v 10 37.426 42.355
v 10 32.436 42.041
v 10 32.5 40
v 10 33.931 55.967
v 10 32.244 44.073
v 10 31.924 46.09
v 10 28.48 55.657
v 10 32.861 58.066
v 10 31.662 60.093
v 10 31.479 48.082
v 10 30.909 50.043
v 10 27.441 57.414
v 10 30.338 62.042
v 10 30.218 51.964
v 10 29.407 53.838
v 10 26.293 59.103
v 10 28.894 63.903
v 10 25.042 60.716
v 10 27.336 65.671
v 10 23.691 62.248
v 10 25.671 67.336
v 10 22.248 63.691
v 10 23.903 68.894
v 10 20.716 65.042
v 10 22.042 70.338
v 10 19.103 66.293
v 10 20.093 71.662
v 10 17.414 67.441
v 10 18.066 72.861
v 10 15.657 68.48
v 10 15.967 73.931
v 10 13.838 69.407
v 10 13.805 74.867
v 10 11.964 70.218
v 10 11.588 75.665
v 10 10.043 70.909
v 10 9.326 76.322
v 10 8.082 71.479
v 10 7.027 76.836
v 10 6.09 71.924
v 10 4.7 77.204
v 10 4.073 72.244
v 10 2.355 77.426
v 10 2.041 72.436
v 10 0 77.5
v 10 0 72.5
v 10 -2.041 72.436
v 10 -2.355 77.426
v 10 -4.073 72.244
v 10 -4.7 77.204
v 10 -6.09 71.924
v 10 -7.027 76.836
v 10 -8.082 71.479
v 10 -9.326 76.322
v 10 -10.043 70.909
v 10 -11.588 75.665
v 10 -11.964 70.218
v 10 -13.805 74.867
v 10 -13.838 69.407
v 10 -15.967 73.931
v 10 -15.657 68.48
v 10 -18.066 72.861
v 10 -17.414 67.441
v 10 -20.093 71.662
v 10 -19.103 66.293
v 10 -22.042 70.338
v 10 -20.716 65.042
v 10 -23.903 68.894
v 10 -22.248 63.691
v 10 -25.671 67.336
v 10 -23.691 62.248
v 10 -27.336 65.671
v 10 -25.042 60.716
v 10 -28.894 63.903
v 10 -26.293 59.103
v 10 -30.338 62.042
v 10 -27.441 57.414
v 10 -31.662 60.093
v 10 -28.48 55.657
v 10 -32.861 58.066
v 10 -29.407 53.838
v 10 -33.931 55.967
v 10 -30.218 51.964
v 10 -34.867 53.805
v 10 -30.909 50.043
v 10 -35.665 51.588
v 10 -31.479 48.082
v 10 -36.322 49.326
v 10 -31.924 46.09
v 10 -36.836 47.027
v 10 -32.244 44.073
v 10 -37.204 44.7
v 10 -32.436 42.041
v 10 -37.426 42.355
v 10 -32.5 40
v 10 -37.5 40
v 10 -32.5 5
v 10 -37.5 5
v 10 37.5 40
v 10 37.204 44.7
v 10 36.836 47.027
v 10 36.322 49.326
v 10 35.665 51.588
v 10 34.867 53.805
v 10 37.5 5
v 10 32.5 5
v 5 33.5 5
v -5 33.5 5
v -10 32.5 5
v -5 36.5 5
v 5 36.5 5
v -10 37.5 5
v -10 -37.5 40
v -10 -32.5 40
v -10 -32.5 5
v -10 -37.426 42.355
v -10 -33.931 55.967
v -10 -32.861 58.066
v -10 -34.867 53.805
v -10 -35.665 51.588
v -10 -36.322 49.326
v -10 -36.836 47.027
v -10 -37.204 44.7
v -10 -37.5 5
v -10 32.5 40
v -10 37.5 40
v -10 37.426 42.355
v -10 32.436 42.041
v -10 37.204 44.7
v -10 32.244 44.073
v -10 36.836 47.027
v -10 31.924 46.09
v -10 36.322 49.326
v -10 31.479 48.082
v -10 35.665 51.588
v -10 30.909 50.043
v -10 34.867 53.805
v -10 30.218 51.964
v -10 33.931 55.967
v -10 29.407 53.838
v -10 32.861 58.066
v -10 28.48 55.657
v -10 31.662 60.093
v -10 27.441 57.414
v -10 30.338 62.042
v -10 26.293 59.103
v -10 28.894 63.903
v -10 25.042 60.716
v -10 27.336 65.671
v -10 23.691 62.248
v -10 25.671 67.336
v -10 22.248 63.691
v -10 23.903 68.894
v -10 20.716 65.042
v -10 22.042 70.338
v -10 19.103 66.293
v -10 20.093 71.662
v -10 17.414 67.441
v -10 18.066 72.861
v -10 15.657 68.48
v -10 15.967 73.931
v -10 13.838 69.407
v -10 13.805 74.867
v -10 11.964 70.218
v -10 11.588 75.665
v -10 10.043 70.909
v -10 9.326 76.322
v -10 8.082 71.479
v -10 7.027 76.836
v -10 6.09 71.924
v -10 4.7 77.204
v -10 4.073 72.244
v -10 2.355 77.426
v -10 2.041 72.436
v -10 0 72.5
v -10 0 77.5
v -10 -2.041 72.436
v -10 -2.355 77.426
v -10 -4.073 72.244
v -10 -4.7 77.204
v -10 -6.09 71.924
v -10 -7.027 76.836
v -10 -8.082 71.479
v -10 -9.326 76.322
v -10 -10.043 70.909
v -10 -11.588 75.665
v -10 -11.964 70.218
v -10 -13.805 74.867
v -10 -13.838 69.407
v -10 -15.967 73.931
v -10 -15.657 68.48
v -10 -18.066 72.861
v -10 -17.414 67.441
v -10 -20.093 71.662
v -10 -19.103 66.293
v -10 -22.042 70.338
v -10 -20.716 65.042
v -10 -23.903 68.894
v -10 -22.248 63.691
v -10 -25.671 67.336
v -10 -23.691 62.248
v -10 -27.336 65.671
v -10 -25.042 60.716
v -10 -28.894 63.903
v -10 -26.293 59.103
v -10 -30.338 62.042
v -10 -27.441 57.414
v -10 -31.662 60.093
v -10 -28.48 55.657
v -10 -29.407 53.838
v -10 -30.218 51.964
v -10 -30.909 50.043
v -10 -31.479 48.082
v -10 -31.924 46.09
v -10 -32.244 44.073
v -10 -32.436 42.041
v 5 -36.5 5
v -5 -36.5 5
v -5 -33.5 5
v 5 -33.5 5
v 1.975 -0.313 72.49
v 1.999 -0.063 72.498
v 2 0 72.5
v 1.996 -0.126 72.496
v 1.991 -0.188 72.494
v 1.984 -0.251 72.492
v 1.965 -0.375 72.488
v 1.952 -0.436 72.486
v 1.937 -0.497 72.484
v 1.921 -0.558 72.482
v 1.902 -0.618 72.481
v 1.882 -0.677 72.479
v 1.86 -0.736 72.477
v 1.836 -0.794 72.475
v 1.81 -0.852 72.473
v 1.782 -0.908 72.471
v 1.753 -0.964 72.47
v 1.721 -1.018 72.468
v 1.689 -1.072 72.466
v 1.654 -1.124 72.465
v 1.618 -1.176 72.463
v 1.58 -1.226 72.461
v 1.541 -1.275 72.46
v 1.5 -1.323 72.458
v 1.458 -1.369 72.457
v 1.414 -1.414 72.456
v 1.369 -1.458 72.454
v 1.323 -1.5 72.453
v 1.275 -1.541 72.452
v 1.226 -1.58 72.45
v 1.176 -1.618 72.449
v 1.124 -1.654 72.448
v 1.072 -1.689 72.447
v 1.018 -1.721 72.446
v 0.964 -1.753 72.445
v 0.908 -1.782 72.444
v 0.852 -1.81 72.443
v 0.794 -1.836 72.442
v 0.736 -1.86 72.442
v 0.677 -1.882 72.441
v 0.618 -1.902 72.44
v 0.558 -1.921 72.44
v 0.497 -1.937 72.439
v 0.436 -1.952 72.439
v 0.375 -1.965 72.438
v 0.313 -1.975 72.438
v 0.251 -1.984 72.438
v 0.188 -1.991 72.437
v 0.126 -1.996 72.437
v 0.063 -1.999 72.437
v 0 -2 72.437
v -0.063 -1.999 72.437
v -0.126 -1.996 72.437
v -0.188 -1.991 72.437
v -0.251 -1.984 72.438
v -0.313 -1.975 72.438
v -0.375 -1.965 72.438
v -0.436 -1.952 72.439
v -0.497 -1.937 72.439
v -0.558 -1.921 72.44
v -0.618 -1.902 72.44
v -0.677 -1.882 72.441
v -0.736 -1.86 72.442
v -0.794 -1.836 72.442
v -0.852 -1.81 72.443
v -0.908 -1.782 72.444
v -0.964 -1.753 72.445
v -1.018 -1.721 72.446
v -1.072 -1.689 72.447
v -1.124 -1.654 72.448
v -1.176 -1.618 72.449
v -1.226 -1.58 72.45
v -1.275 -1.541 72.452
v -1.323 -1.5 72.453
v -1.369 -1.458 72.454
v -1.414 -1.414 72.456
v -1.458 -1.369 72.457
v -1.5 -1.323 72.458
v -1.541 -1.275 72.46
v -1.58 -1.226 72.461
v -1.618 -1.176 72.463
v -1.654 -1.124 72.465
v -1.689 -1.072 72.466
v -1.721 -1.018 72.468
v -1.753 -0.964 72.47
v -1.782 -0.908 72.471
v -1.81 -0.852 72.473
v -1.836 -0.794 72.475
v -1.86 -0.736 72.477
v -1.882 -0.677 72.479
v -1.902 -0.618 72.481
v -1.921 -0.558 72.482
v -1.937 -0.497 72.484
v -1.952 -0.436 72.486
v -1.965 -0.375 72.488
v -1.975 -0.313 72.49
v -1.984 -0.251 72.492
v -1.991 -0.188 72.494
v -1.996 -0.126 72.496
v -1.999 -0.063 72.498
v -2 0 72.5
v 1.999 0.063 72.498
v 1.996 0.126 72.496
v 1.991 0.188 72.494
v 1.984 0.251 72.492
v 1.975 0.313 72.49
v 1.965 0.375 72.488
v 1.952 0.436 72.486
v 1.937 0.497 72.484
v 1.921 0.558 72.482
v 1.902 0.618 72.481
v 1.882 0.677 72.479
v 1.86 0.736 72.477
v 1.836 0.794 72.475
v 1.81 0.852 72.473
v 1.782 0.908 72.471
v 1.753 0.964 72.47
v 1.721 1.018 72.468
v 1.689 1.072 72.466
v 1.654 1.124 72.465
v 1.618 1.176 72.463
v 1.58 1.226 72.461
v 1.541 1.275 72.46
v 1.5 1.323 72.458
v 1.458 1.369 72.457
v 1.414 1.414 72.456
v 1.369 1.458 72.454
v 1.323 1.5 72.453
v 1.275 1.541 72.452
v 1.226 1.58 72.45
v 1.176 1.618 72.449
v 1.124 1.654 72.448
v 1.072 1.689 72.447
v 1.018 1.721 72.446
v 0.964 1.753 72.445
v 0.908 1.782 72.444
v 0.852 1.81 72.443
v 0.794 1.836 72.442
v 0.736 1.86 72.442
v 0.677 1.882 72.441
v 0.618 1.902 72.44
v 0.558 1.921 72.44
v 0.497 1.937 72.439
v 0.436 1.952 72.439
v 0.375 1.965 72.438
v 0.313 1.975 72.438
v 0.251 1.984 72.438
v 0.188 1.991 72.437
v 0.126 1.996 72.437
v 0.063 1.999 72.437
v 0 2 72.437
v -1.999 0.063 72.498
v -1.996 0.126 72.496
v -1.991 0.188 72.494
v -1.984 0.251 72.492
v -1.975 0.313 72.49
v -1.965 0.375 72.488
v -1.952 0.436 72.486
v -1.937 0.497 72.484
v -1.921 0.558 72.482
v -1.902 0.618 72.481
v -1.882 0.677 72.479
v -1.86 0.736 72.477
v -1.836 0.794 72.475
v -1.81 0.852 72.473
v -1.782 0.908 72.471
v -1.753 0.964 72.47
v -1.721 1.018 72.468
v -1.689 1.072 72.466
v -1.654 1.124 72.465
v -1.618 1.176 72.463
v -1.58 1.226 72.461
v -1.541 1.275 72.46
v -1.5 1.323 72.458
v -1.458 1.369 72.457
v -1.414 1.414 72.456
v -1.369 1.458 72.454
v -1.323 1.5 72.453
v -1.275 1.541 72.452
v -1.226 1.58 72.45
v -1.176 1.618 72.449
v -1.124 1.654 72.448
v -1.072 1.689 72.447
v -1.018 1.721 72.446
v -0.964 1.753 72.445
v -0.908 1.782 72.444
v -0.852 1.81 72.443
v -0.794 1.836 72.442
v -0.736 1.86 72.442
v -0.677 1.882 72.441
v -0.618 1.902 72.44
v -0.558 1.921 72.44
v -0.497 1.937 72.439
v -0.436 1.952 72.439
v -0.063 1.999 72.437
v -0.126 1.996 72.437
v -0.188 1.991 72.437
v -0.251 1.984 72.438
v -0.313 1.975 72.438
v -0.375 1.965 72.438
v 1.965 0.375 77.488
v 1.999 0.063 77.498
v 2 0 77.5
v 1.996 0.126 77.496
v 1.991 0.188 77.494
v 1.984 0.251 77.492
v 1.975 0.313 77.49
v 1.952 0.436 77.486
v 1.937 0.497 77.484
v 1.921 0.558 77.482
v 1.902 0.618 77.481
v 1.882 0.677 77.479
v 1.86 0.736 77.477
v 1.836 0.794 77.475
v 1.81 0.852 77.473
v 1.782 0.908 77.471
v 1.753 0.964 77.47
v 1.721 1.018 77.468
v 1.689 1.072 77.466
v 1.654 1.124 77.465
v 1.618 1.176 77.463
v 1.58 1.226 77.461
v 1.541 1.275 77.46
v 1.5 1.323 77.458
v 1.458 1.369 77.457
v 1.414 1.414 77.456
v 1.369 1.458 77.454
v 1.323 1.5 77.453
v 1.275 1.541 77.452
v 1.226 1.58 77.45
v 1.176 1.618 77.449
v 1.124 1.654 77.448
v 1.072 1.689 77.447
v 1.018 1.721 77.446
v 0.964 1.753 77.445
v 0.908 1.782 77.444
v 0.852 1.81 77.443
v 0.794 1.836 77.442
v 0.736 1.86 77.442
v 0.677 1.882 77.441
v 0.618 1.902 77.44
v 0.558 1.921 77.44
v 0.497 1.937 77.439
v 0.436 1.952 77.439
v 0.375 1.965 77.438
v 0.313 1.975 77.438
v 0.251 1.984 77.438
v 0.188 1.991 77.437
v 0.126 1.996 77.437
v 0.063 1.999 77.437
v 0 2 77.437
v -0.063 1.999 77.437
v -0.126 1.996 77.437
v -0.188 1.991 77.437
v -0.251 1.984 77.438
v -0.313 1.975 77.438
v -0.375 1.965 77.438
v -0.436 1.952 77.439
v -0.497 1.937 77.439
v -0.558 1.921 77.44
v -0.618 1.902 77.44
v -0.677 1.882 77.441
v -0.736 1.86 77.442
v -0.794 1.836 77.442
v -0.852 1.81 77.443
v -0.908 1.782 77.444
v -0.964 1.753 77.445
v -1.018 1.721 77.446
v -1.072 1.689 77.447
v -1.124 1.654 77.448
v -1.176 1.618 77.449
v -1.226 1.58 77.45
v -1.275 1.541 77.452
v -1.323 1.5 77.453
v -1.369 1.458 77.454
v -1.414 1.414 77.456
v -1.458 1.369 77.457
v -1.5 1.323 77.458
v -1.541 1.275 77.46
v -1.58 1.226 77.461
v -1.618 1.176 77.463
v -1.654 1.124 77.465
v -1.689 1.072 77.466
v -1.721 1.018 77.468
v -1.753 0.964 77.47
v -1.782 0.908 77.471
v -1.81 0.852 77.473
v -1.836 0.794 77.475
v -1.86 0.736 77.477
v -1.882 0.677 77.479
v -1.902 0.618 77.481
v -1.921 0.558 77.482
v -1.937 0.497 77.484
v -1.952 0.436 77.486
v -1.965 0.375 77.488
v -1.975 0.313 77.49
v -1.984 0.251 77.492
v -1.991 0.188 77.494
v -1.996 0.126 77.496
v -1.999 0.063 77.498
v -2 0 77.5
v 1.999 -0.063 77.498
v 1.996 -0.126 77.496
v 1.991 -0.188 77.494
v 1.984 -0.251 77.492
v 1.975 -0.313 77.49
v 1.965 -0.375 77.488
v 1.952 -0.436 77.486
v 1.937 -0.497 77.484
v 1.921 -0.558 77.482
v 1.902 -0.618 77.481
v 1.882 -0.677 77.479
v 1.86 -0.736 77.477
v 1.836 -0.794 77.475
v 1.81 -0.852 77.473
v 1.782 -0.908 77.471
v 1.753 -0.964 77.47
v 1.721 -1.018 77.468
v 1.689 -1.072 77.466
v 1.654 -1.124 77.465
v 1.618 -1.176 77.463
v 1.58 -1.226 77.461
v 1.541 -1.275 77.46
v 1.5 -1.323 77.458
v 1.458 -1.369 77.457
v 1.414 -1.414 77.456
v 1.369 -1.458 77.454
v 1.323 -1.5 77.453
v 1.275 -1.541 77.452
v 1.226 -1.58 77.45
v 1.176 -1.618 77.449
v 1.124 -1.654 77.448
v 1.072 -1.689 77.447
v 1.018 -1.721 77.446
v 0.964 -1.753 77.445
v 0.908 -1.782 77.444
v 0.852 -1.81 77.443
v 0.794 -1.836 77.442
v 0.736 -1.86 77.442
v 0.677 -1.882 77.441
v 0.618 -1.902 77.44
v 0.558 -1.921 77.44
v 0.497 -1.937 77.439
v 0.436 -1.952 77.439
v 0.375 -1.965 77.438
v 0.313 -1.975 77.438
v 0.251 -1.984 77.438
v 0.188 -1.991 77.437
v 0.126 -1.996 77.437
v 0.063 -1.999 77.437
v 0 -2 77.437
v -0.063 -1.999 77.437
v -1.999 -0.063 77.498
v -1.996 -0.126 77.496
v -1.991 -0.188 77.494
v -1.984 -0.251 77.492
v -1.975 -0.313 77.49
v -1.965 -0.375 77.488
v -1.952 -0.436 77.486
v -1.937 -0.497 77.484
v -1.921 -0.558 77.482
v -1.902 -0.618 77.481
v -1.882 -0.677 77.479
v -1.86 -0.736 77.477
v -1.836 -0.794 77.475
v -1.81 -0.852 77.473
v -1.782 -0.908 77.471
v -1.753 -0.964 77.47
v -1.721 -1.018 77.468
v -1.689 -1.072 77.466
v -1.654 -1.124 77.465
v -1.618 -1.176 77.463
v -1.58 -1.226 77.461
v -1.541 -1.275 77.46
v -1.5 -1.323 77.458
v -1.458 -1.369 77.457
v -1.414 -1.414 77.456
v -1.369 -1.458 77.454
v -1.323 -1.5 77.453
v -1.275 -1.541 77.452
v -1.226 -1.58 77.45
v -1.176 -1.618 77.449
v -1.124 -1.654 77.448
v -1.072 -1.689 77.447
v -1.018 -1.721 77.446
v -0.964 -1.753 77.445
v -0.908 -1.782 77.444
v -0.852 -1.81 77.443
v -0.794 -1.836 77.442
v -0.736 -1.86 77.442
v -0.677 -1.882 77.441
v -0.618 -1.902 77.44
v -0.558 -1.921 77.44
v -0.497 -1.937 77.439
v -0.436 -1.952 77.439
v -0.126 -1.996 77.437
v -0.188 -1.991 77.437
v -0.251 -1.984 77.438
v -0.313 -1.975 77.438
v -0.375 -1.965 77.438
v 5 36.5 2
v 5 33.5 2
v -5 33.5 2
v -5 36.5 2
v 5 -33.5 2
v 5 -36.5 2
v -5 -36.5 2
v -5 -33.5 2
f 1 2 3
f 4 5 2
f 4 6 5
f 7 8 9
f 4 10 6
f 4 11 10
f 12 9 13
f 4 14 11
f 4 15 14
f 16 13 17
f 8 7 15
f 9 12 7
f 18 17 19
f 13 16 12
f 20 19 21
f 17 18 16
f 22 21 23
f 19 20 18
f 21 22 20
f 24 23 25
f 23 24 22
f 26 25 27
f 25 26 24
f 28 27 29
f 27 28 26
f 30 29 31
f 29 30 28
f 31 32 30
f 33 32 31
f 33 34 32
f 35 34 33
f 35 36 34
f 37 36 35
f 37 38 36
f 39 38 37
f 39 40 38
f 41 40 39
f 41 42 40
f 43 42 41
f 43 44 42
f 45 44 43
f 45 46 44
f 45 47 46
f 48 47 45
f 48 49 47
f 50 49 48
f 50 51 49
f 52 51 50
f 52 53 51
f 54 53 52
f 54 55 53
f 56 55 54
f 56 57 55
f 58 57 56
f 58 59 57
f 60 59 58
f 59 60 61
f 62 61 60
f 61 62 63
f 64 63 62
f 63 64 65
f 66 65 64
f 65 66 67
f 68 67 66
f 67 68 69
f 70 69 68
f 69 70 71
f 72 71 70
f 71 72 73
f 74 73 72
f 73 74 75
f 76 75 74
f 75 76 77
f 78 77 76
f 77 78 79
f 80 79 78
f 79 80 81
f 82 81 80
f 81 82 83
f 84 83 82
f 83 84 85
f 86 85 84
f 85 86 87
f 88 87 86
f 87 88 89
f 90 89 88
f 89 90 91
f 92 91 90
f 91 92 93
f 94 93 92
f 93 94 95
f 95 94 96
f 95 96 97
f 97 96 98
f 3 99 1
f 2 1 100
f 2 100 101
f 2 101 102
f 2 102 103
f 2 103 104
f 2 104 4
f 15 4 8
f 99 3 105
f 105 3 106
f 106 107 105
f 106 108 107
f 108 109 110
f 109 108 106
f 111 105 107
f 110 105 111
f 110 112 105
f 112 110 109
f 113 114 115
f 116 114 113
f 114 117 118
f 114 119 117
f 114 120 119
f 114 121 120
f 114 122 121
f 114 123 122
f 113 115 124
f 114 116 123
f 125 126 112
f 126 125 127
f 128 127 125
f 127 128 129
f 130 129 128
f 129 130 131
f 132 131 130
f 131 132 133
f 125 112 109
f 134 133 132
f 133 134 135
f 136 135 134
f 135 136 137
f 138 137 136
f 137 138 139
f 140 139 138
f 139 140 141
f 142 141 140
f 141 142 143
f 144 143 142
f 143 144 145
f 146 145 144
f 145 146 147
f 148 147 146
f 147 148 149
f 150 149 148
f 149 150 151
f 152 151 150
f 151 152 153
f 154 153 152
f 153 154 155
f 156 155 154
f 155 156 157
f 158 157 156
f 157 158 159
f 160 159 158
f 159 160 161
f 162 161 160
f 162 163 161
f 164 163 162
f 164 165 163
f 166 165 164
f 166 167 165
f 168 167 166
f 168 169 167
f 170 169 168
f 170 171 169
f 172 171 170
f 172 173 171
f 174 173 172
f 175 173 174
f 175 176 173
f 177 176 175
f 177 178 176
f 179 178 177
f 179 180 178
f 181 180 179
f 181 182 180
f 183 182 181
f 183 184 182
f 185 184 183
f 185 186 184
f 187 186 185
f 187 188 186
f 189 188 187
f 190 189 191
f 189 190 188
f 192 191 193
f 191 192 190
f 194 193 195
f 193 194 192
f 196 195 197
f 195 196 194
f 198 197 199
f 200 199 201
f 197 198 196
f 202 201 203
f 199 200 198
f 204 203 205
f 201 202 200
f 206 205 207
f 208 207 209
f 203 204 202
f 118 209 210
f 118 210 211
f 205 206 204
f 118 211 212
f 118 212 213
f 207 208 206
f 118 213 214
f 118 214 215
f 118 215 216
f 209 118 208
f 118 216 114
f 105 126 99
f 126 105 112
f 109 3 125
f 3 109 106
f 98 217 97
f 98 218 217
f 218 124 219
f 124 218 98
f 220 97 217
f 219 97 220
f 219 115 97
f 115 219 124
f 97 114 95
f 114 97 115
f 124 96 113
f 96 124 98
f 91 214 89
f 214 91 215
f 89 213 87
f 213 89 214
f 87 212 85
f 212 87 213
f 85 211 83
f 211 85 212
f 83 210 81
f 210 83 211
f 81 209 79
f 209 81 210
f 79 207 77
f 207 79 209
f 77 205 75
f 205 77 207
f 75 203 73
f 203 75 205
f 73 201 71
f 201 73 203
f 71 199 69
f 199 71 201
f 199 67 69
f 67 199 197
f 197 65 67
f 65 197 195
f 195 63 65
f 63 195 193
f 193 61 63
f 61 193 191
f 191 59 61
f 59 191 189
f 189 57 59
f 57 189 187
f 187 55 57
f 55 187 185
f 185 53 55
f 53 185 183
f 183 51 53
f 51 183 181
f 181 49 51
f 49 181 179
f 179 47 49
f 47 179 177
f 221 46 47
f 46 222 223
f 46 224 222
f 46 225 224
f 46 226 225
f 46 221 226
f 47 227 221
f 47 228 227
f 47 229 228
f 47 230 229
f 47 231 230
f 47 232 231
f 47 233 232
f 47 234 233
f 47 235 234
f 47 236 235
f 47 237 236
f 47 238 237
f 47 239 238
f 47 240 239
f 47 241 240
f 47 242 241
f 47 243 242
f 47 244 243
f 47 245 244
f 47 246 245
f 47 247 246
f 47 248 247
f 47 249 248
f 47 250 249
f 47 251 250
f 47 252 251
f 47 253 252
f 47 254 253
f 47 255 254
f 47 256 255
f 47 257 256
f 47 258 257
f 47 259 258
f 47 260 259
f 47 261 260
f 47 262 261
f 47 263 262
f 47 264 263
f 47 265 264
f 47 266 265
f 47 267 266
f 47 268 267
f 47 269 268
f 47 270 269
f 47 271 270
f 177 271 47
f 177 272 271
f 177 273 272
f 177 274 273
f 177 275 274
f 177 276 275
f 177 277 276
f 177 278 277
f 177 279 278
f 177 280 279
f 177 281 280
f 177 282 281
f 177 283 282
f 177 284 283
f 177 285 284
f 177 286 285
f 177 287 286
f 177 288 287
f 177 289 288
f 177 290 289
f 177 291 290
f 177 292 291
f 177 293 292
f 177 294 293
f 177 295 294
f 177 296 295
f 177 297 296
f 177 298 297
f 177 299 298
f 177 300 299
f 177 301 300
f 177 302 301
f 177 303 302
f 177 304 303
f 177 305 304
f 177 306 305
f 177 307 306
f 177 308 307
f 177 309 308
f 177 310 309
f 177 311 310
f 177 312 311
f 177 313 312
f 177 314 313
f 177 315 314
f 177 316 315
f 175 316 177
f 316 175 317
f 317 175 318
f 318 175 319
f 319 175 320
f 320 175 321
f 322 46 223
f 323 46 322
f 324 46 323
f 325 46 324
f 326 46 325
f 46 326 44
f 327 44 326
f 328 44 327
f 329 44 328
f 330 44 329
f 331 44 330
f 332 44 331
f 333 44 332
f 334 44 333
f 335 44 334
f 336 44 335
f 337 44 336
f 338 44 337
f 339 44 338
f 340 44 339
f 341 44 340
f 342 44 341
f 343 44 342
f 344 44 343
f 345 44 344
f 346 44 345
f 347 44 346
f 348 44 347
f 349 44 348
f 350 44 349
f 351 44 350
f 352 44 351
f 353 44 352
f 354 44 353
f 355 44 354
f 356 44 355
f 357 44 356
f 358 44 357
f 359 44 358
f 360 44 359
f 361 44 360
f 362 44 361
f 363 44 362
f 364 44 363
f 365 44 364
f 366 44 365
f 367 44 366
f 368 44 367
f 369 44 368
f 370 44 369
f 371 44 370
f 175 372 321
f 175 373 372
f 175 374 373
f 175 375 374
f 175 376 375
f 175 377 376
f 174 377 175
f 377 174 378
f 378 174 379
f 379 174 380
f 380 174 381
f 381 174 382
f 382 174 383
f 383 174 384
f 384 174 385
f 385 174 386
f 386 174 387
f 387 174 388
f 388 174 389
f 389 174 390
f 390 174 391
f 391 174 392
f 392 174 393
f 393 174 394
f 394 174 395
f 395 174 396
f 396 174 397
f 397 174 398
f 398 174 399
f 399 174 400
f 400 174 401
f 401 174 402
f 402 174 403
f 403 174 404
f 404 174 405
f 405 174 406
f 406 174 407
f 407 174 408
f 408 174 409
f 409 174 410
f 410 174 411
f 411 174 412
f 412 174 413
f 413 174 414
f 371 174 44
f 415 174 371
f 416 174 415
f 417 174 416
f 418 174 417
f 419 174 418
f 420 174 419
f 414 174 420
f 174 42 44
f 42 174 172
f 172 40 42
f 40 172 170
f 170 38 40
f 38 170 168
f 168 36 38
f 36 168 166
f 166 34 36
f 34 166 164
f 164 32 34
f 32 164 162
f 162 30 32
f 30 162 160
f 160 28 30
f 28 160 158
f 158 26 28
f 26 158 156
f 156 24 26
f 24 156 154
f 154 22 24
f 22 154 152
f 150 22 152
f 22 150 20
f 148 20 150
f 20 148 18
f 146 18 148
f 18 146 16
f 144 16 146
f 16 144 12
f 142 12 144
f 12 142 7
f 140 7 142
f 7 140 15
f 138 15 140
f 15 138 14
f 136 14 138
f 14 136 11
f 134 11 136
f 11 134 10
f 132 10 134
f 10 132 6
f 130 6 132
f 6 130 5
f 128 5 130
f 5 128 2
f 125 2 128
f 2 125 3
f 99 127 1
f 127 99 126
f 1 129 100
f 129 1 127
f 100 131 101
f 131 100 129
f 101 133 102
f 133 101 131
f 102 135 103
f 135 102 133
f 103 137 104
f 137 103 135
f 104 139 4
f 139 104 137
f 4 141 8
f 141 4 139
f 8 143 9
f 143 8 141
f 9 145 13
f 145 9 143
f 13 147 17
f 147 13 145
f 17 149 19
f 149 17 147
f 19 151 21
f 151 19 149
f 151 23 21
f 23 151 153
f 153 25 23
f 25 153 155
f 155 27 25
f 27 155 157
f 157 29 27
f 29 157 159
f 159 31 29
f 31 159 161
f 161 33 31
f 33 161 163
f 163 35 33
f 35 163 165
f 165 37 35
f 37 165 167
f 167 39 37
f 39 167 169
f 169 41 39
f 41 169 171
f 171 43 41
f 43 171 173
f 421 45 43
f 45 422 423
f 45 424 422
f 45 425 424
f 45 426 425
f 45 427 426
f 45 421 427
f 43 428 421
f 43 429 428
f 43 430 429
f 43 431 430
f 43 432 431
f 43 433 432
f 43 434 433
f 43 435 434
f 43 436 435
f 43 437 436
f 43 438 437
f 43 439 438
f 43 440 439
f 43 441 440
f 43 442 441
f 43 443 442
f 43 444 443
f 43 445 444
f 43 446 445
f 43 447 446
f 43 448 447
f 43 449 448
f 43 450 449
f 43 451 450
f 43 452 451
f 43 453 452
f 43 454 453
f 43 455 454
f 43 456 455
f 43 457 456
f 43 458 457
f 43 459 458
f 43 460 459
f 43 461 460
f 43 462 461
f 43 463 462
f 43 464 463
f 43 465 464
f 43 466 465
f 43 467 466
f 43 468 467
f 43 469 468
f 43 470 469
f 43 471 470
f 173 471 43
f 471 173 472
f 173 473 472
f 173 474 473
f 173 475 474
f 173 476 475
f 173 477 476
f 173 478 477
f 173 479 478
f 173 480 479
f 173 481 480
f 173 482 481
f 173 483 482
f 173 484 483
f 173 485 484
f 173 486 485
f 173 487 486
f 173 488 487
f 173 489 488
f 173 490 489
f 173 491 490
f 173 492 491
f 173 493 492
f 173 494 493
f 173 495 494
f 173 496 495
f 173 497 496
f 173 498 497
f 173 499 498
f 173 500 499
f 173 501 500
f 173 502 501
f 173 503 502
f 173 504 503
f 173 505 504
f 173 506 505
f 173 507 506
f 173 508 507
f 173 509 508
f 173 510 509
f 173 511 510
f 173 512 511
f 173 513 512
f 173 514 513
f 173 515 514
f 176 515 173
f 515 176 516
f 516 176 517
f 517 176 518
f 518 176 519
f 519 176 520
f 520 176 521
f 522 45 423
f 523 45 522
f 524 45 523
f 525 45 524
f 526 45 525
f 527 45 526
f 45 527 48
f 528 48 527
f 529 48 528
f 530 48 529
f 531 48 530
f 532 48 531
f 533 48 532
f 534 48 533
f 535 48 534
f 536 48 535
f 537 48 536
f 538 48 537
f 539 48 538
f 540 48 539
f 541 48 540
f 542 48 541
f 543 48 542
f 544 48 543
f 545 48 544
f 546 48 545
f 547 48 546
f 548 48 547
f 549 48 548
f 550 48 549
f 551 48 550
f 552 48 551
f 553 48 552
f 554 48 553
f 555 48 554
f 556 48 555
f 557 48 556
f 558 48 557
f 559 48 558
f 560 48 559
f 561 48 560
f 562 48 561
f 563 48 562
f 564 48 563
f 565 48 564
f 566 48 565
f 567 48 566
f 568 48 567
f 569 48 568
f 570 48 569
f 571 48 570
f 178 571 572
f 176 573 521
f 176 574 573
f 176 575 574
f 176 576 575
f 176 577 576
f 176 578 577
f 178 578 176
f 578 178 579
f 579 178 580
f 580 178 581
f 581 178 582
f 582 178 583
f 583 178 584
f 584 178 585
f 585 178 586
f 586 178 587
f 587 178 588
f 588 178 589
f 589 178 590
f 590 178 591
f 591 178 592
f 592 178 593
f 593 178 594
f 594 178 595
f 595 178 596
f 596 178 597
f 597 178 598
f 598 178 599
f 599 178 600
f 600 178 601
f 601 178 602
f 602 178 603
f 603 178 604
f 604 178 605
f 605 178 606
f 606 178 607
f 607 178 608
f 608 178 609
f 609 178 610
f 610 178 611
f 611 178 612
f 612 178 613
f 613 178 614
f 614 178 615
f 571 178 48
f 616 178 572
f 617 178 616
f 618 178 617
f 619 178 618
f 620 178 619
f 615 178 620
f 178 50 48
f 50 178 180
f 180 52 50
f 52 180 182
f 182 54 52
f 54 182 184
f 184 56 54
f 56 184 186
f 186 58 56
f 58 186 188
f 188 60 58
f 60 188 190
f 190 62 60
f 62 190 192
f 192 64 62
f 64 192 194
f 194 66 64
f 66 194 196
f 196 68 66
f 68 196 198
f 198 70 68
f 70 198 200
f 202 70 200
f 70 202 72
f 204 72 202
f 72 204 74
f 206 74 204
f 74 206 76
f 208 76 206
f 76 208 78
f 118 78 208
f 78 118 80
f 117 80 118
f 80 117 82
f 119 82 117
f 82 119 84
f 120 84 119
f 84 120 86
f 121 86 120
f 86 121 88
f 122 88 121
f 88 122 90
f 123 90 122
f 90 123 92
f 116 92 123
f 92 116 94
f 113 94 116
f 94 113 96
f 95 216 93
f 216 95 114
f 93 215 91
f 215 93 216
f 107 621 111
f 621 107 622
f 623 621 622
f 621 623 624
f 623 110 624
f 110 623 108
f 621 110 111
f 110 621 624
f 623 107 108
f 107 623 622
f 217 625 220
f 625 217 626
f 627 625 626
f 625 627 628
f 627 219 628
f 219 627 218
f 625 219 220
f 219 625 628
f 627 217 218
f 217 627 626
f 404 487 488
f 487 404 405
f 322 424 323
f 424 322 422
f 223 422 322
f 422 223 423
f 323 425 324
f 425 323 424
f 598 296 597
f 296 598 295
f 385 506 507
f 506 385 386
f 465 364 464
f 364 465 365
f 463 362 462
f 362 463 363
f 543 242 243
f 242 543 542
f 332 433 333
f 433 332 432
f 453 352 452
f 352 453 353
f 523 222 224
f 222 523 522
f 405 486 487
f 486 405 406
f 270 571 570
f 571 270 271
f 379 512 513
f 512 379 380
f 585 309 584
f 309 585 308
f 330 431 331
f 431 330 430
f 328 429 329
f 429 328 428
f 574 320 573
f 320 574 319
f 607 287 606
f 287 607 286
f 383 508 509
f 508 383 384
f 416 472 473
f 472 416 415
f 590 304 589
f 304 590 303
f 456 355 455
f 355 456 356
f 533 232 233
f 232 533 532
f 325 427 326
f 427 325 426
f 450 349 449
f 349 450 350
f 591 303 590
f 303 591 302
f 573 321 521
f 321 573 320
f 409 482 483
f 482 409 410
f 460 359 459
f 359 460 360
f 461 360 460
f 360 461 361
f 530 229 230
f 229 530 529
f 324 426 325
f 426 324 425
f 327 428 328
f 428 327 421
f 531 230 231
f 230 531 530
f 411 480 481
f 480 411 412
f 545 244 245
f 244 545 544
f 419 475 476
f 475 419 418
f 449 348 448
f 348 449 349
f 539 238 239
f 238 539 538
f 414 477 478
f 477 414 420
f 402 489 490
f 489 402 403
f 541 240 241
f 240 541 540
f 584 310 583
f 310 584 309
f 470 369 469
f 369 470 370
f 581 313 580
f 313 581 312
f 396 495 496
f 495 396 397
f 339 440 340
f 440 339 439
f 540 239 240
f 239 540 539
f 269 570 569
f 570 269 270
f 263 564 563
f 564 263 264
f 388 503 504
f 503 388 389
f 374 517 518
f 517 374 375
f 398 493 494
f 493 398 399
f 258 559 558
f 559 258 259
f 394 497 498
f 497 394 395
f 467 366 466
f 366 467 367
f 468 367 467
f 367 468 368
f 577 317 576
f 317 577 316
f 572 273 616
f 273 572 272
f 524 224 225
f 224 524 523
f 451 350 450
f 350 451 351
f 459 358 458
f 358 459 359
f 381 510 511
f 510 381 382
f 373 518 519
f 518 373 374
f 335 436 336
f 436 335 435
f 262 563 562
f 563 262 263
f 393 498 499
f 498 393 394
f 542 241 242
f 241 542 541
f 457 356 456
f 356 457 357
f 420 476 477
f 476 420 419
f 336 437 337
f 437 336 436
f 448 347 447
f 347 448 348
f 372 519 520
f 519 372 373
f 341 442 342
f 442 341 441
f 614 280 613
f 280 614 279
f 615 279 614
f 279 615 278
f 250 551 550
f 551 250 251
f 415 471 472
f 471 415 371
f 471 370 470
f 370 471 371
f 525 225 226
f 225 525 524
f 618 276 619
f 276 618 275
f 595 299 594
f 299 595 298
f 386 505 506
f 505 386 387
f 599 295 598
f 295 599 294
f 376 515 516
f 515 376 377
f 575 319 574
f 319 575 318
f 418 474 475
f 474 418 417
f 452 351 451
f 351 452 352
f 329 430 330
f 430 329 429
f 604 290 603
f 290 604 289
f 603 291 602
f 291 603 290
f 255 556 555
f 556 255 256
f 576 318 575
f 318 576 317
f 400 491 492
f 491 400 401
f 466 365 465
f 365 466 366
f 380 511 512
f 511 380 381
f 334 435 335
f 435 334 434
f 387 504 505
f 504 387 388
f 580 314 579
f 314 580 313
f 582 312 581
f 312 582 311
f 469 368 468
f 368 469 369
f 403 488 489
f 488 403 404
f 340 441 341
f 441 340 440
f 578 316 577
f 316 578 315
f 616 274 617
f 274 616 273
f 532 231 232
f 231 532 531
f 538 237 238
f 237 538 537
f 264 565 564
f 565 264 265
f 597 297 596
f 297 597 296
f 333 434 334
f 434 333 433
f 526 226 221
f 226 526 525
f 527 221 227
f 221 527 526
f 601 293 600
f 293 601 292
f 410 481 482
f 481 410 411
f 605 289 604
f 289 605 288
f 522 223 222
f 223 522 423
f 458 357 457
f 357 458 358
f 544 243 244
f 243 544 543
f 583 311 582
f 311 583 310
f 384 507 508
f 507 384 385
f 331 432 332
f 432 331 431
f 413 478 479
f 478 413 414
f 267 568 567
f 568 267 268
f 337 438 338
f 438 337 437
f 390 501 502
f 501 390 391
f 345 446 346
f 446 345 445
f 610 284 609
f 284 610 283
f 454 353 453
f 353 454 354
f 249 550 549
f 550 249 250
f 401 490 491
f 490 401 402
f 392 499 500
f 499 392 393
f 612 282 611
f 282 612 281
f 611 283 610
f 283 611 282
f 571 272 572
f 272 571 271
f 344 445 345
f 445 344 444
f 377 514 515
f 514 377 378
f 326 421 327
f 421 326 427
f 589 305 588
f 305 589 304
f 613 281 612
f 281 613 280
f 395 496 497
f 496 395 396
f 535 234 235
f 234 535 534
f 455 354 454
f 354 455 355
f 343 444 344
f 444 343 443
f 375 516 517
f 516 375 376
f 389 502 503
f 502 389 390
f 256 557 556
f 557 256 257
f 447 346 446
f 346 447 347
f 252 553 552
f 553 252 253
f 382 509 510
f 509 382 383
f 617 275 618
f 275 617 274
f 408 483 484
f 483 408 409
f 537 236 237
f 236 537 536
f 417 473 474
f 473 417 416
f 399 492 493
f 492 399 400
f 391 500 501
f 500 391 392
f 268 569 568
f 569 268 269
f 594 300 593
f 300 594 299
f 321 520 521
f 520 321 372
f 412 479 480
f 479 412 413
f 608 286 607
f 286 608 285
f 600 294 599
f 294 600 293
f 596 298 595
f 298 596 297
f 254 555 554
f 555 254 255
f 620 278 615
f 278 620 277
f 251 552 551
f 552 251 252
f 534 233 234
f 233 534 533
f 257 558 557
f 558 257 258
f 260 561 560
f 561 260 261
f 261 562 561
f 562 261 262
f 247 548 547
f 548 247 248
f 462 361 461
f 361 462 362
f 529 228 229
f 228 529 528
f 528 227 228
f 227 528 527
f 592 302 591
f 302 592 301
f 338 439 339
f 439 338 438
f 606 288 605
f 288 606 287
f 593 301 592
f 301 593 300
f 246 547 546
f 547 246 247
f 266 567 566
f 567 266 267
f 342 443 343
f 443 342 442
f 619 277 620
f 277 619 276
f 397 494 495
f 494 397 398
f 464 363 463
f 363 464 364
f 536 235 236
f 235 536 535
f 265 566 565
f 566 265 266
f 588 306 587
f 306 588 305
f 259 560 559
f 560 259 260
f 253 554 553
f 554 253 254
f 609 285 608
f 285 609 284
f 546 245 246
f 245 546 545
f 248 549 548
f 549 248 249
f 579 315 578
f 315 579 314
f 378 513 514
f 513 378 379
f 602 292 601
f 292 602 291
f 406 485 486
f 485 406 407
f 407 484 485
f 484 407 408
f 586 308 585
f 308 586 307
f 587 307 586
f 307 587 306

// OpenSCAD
 
 doArc=true;
 doBase=false;
 separator=false;
 
 
 lc_h=5; // large cylinder heigh 
 lc_r=50; // large cylinder radius
 n = 16; // number holes
 sc_h=lc_h+2; // small cylinder heigh 
 sc_r=2; // small cylinder radius
 sc_R= lc_r - 3 * sc_r; // place small holes on this circle
 
 arc_r = 35; // arch radius
 arc_w = 20; // arch width
 arc_h = arc_r; //
 arc_l = lc_h;
 
 arc_length=10;
 arc_width=3;
 arc_height=3;
 
 $fn=200;
 step = 360/n;
 offset = step/2.; // rotate holes by this ammount
 
function vectorLength(v1,v2) = sqrt(
    (v2[0]-v1[0])*(v2[0]-v1[0])+
    (v2[1]-v1[1])*(v2[1]-v1[1])+
    (v2[2]-v1[2])*(v2[2]-v1[2]));

function lookAt(v1, v2) =
    let(v = v2-v1)
    [
       0,
       acos(v[2]/vectorLength(v1,v2)),
       atan2(v[1], v[0])
    ];

module cylinderBetween(p1,p2,radius)
{
    translate(p1)
    rotate(lookAt(p1,p2))
    cylinder(vectorLength(p1,p2),radius,radius);
}

module ancor(length, width, height)
{
    translate([-length/2,
               arc_r-width/2,
               lc_h-height])
    cube([length, width, height+1]);
    translate([-length/2,
               -arc_r-width/2,
                lc_h-height])
    cube([length, width, height+1]);
}

module sector(radius, angles, fn = 24) {
    r = radius / cos(180 / fn);
    step = -360 / fn;

    points = concat([[0, 0]],
        [for(a = [angles[0] : step : angles[1] - 360]) 
            [r * cos(a), r * sin(a)]
        ],
        [[r * cos(angles[1]), r * sin(angles[1])]]
    );

    difference() {
        circle(radius, $fn = fn);
        polygon(points);
    }
}

module arc(radius, angles, width = 1, fn = 100) {
    difference() {
        sector(radius + width, angles, fn);
        sector(radius, angles, fn);
    }
} 

module fullarc(length, width, height)
{
    translate([-length/2,
               arc_r-width/2,
               lc_h])
 cube([arc_w, arc_l, arc_h]);
    translate([-length/2,
               -arc_r-width/2,
                lc_h])
 cube([arc_w, arc_l, arc_h]);
  rotate([90,0,90])
  translate([0,height+arc_l, -length/2])
  linear_extrude(arc_w)  
  arc(arc_r-arc_l/2, [0, 180], arc_l);   
//ancor
        translate([-arc_length/2,
               arc_r-arc_width/2,
               lc_h-arc_height])
    cube([arc_length, arc_width, arc_height+1]);
    translate([-arc_length/2,
               -arc_r-arc_width/2,
                lc_h-arc_height])
    cube([arc_length, arc_width, arc_height+1]);

}
    

//Base
if(doBase)
{
difference(){
 cylinder(h=lc_h,r=lc_r);

// place passing cylinder
 for ( angle = [0 : step : 359.99] ){
     translate([sin(angle+offset)*sc_R, 
                cos(angle+offset)*sc_R, -1 ])
     cylinder(h = sc_h, r=sc_r);
     }
     
 // join pairs of cylinders
 for ( angle = [0 : 2*step : 359.99] ){
     x1 = sin(angle+offset)*sc_R;
     y1 = cos(angle+offset)*sc_R;
     x2 = sin(angle+offset+step)*sc_R;
     y2 = cos(angle+offset+step)*sc_R;
     P1=[x1, y1, 0];
     P2=[x2, y2, 0];
     cylinderBetween(P1, P2, sc_r);
     }
     ancor(arc_length+1, arc_width+1, arc_height);
  }
 }
 //arch
if(doArc){ 
 difference() {
     fullarc(arc_w, arc_l, arc_h);
     cylinder(80,sc_r,sc_r);
 }
}
